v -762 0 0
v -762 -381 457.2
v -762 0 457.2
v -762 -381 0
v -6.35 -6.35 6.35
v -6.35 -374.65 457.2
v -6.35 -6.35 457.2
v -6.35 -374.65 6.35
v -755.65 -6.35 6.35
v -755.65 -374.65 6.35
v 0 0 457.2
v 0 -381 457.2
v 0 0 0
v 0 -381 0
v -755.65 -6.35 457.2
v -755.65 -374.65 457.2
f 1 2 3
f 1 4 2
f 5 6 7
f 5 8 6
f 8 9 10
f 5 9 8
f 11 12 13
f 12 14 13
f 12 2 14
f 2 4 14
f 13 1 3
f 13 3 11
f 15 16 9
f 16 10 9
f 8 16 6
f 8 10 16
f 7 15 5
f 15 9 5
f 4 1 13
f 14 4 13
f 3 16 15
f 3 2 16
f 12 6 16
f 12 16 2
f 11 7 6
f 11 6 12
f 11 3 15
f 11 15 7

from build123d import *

# Parameters (mm, degrees)
F0_W     = 762
F0_H     = 381
F1_DEPTH = 431.8
F2_DEPTH = 25.4
F3_T     = -6.35


with BuildPart() as f1:
    # F0 (on Top) → F1 (new body)
    with BuildSketch(Plane.XY):
        with Locations((-381, -190.5)):
            Rectangle(F0_W, F0_H)
    extrude(amount=F1_DEPTH)

    # F2 (add): a face of the model
    f2_faces = [f1.faces().sort_by_distance(p)[0] for p in [
        (-381, -190.5, 431.8),
    ]]
    extrude(f2_faces, amount=F2_DEPTH)

    # F3
    f3_openings = [f1.faces().sort_by_distance(p)[0] for p in [
        (-381, -190.5, 457.2),
    ]]
    offset(amount=F3_T, openings=f3_openings)


solid = f1.part
